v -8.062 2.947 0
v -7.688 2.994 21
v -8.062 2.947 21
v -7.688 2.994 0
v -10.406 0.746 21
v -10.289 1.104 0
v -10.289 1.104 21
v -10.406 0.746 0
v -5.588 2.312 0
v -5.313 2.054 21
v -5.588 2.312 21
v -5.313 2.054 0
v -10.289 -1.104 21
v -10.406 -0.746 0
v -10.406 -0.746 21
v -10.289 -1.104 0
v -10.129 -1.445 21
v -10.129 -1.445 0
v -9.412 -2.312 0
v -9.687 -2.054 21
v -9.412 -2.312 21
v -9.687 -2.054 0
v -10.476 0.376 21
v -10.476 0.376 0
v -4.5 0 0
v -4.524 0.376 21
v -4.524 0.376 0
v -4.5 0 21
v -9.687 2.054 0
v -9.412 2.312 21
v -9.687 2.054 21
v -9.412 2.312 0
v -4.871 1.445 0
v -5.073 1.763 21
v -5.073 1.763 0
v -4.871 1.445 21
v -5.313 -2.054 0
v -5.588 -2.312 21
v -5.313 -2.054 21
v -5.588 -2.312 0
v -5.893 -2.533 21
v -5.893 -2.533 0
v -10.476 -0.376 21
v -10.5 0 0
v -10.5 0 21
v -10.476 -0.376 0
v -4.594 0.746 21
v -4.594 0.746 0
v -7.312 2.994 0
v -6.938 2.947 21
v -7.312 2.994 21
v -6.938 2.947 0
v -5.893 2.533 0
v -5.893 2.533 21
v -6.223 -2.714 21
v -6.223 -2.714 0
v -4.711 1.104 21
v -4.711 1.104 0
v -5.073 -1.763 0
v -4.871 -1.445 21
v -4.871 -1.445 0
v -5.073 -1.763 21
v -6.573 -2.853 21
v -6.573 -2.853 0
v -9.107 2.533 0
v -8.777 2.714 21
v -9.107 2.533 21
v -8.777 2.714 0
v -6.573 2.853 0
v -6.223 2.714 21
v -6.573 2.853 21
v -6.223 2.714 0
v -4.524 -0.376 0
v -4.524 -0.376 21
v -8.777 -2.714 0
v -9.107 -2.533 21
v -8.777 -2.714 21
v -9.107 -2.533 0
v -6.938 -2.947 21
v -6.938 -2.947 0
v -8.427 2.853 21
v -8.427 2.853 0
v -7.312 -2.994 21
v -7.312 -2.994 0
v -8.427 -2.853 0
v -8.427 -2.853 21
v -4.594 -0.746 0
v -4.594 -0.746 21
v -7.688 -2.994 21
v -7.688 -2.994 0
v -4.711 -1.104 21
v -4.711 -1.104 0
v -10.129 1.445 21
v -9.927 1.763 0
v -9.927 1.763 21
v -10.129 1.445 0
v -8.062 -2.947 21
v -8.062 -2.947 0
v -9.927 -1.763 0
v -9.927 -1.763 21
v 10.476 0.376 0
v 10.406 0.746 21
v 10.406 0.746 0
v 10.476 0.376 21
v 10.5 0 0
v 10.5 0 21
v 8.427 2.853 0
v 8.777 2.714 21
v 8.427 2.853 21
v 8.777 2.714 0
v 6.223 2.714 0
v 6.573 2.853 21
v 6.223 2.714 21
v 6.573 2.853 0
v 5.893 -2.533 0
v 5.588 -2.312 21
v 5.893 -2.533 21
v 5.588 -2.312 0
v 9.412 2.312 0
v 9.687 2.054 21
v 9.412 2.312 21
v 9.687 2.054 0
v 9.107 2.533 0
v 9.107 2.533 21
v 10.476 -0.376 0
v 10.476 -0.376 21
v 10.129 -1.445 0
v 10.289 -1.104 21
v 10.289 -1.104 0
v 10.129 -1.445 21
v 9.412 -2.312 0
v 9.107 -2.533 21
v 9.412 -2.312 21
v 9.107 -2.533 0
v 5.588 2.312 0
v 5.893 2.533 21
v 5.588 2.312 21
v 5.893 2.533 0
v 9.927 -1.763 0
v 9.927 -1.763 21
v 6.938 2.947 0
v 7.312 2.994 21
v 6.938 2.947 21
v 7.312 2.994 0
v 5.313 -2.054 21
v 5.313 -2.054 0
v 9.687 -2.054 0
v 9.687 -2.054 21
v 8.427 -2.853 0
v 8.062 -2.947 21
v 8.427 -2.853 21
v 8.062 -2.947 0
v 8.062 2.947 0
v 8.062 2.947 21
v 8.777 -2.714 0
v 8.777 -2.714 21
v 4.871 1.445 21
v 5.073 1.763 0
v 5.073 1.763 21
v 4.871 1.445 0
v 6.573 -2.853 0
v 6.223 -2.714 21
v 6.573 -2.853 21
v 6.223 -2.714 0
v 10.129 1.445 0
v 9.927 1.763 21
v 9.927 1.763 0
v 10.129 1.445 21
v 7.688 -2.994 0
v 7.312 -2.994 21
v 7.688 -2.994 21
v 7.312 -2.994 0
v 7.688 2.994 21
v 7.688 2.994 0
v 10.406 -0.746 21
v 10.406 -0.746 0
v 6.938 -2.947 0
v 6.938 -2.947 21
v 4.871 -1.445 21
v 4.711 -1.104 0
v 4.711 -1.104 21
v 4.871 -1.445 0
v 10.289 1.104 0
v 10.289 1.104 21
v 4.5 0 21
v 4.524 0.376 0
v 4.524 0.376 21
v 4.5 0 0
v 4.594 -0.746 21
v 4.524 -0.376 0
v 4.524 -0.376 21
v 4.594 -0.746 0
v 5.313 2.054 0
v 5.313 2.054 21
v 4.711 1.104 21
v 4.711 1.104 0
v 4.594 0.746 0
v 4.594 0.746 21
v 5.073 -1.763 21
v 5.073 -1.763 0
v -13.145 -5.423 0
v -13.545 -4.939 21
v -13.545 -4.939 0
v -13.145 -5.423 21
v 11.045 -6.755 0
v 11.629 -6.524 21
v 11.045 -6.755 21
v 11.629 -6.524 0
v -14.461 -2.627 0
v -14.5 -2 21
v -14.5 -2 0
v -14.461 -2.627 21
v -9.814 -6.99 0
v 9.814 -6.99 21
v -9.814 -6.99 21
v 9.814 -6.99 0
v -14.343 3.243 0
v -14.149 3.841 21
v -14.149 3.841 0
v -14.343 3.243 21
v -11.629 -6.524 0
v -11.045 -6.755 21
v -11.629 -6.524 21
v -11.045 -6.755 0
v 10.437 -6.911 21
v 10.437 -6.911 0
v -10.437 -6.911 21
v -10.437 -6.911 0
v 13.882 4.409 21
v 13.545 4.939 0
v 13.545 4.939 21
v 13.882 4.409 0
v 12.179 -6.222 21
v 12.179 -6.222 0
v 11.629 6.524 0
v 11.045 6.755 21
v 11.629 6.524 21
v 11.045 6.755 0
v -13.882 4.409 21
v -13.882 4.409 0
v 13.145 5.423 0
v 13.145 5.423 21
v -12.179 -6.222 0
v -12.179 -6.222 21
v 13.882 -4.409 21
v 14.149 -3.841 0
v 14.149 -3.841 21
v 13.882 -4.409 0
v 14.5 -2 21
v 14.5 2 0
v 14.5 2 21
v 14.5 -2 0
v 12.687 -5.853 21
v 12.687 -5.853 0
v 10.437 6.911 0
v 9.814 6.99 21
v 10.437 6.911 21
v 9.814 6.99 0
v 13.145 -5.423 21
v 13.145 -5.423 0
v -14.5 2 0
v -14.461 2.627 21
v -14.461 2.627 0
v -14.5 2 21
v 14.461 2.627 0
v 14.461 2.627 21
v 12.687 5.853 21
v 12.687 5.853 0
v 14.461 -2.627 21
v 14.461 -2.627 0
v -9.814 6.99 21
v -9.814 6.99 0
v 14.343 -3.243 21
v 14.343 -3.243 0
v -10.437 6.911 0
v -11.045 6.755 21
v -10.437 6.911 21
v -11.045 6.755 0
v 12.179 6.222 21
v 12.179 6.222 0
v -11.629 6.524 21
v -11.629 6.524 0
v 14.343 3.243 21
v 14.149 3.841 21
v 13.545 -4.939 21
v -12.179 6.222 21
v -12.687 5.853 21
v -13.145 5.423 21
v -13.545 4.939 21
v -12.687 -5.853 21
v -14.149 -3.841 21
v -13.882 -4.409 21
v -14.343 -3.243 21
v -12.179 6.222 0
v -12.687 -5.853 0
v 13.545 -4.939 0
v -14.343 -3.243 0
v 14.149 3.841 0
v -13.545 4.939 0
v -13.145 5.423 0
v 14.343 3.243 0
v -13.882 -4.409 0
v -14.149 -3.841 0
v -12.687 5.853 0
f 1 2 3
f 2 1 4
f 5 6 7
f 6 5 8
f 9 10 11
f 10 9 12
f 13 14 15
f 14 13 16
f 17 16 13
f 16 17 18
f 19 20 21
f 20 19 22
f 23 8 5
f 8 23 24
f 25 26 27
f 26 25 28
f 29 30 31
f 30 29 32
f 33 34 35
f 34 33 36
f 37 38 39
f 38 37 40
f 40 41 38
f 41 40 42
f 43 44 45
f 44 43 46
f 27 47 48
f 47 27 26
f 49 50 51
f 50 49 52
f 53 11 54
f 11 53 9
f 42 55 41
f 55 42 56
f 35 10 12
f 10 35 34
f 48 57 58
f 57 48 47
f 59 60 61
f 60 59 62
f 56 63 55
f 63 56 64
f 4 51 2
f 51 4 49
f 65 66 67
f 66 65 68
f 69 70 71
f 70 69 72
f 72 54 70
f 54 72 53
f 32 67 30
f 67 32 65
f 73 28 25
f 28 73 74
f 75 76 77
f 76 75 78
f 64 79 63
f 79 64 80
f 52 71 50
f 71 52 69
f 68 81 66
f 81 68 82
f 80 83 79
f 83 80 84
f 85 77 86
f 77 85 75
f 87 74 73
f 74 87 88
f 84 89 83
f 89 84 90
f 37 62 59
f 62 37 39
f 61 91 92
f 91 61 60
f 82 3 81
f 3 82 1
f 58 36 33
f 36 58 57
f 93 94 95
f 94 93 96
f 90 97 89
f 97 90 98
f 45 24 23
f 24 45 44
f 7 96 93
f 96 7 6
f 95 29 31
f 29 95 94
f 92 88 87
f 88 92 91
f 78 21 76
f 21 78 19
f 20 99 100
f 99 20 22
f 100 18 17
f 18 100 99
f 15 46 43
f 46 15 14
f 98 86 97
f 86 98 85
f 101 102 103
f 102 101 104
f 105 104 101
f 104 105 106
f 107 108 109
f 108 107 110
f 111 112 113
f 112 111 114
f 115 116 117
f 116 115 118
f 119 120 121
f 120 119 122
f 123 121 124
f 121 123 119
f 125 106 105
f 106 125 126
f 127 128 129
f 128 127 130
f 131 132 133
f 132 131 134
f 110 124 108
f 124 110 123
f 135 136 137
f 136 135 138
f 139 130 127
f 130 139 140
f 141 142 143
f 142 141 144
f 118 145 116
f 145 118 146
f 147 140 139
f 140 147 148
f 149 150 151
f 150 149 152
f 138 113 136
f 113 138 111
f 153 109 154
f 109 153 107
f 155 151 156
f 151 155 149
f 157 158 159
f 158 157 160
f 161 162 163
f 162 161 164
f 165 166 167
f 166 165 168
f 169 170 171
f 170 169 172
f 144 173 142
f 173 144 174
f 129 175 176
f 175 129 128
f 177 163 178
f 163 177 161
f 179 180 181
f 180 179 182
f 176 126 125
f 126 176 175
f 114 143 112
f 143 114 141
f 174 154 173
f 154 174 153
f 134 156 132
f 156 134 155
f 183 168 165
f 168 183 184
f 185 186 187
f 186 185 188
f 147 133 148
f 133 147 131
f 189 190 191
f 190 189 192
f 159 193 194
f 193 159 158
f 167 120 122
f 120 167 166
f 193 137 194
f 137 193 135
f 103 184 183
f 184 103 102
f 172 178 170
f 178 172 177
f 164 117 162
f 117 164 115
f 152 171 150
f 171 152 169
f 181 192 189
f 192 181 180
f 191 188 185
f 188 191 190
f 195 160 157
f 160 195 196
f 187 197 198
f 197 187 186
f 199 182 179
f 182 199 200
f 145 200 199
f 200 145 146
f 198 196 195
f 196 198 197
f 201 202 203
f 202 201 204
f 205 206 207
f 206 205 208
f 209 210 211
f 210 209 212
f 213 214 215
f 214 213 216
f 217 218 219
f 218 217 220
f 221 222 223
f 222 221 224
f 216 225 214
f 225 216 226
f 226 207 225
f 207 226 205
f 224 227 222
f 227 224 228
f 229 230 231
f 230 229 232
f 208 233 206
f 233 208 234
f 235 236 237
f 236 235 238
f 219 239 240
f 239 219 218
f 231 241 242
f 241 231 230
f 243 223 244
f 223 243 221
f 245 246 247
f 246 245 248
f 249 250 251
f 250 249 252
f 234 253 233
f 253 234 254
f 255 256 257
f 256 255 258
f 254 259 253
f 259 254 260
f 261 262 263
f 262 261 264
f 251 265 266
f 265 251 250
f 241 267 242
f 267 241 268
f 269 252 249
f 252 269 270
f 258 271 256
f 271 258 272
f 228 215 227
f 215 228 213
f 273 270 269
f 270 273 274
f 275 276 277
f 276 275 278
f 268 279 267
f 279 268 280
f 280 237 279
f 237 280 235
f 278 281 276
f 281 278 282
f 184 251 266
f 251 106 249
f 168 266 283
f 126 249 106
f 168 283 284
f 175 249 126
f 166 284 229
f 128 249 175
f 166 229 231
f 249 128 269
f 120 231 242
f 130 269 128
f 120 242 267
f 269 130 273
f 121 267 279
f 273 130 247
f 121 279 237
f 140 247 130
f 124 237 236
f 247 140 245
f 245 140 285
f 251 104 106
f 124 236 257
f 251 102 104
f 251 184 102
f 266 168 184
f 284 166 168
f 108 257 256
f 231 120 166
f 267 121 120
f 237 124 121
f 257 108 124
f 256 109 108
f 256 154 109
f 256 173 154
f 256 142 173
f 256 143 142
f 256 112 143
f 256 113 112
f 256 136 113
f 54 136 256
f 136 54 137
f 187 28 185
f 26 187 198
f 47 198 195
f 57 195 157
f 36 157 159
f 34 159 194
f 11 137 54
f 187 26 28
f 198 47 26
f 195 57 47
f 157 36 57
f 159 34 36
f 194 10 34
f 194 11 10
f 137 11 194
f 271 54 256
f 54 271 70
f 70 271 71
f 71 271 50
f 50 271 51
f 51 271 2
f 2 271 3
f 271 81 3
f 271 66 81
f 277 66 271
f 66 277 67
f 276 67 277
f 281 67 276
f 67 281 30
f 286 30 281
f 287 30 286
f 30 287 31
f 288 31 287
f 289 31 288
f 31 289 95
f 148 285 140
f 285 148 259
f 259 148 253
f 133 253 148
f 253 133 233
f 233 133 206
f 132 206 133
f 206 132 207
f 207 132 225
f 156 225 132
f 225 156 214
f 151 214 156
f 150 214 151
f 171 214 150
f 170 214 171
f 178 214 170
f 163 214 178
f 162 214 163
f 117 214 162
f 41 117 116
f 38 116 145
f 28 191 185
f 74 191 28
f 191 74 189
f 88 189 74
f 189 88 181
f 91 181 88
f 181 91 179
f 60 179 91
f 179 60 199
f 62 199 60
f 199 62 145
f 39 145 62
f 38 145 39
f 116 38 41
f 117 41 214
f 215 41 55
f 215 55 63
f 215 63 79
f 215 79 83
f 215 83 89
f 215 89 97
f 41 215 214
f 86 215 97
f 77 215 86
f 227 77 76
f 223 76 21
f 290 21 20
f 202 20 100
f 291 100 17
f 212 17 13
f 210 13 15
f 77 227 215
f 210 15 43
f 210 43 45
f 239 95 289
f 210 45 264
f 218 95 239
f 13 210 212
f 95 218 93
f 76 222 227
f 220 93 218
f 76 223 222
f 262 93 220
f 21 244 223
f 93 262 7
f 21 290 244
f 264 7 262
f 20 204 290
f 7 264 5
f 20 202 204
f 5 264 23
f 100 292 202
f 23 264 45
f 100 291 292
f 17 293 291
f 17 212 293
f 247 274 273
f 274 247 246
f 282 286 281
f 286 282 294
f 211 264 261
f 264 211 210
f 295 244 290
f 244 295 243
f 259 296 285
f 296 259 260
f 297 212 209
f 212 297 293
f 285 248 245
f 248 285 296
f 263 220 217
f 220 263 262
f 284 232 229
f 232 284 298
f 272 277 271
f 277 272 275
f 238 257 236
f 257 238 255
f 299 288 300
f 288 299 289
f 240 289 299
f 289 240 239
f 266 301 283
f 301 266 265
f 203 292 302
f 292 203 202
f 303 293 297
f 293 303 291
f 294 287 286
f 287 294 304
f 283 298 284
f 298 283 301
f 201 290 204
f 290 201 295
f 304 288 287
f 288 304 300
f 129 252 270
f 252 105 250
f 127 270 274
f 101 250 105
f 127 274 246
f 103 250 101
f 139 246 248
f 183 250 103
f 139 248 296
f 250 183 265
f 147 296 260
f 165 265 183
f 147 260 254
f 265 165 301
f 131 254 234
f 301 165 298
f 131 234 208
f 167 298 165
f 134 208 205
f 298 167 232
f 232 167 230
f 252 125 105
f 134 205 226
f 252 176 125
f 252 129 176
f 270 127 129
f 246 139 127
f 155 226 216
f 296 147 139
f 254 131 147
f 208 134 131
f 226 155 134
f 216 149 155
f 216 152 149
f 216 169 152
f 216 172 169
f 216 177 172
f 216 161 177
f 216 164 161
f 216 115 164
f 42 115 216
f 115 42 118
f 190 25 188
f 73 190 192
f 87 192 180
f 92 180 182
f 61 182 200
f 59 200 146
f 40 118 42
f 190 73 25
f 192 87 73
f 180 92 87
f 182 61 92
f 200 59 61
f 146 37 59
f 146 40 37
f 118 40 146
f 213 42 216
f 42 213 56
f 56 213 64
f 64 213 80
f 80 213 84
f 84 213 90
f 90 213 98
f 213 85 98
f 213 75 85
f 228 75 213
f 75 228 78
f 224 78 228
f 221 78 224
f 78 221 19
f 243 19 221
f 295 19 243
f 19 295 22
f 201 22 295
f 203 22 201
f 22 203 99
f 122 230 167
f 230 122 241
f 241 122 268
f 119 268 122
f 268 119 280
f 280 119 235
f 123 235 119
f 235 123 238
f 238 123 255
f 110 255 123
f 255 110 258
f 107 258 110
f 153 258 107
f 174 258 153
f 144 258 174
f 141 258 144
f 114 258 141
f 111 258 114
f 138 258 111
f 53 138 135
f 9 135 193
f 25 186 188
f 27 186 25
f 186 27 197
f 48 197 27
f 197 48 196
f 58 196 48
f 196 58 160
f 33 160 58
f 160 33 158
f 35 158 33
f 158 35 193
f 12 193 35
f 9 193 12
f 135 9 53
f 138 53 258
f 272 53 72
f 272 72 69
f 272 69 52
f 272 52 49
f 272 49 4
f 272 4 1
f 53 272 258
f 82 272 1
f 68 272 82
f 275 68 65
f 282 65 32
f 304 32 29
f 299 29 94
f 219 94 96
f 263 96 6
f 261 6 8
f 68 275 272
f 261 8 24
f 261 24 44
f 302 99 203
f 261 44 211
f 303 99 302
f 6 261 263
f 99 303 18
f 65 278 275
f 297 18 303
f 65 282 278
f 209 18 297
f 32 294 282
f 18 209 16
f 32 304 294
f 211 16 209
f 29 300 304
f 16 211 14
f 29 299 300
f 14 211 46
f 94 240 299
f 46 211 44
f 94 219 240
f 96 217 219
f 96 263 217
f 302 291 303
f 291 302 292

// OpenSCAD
$fn = 50;


difference() {
	union() {
		hull() {
			translate(v = [-9.5000000000, 2.0000000000, 0]) {
				cylinder(h = 21, r = 5);
			}
			translate(v = [9.5000000000, 2.0000000000, 0]) {
				cylinder(h = 21, r = 5);
			}
			translate(v = [-9.5000000000, -2.0000000000, 0]) {
				cylinder(h = 21, r = 5);
			}
			translate(v = [9.5000000000, -2.0000000000, 0]) {
				cylinder(h = 21, r = 5);
			}
		}
	}
	union() {
		translate(v = [-7.5000000000, 0.0000000000, 0]) {
			translate(v = [0, 0, -100]) {
				cylinder(h = 200, r = 3.0000000000);
			}
		}
		translate(v = [7.5000000000, 0.0000000000, 0]) {
			translate(v = [0, 0, -100]) {
				cylinder(h = 200, r = 3.0000000000);
			}
		}
	}
}
